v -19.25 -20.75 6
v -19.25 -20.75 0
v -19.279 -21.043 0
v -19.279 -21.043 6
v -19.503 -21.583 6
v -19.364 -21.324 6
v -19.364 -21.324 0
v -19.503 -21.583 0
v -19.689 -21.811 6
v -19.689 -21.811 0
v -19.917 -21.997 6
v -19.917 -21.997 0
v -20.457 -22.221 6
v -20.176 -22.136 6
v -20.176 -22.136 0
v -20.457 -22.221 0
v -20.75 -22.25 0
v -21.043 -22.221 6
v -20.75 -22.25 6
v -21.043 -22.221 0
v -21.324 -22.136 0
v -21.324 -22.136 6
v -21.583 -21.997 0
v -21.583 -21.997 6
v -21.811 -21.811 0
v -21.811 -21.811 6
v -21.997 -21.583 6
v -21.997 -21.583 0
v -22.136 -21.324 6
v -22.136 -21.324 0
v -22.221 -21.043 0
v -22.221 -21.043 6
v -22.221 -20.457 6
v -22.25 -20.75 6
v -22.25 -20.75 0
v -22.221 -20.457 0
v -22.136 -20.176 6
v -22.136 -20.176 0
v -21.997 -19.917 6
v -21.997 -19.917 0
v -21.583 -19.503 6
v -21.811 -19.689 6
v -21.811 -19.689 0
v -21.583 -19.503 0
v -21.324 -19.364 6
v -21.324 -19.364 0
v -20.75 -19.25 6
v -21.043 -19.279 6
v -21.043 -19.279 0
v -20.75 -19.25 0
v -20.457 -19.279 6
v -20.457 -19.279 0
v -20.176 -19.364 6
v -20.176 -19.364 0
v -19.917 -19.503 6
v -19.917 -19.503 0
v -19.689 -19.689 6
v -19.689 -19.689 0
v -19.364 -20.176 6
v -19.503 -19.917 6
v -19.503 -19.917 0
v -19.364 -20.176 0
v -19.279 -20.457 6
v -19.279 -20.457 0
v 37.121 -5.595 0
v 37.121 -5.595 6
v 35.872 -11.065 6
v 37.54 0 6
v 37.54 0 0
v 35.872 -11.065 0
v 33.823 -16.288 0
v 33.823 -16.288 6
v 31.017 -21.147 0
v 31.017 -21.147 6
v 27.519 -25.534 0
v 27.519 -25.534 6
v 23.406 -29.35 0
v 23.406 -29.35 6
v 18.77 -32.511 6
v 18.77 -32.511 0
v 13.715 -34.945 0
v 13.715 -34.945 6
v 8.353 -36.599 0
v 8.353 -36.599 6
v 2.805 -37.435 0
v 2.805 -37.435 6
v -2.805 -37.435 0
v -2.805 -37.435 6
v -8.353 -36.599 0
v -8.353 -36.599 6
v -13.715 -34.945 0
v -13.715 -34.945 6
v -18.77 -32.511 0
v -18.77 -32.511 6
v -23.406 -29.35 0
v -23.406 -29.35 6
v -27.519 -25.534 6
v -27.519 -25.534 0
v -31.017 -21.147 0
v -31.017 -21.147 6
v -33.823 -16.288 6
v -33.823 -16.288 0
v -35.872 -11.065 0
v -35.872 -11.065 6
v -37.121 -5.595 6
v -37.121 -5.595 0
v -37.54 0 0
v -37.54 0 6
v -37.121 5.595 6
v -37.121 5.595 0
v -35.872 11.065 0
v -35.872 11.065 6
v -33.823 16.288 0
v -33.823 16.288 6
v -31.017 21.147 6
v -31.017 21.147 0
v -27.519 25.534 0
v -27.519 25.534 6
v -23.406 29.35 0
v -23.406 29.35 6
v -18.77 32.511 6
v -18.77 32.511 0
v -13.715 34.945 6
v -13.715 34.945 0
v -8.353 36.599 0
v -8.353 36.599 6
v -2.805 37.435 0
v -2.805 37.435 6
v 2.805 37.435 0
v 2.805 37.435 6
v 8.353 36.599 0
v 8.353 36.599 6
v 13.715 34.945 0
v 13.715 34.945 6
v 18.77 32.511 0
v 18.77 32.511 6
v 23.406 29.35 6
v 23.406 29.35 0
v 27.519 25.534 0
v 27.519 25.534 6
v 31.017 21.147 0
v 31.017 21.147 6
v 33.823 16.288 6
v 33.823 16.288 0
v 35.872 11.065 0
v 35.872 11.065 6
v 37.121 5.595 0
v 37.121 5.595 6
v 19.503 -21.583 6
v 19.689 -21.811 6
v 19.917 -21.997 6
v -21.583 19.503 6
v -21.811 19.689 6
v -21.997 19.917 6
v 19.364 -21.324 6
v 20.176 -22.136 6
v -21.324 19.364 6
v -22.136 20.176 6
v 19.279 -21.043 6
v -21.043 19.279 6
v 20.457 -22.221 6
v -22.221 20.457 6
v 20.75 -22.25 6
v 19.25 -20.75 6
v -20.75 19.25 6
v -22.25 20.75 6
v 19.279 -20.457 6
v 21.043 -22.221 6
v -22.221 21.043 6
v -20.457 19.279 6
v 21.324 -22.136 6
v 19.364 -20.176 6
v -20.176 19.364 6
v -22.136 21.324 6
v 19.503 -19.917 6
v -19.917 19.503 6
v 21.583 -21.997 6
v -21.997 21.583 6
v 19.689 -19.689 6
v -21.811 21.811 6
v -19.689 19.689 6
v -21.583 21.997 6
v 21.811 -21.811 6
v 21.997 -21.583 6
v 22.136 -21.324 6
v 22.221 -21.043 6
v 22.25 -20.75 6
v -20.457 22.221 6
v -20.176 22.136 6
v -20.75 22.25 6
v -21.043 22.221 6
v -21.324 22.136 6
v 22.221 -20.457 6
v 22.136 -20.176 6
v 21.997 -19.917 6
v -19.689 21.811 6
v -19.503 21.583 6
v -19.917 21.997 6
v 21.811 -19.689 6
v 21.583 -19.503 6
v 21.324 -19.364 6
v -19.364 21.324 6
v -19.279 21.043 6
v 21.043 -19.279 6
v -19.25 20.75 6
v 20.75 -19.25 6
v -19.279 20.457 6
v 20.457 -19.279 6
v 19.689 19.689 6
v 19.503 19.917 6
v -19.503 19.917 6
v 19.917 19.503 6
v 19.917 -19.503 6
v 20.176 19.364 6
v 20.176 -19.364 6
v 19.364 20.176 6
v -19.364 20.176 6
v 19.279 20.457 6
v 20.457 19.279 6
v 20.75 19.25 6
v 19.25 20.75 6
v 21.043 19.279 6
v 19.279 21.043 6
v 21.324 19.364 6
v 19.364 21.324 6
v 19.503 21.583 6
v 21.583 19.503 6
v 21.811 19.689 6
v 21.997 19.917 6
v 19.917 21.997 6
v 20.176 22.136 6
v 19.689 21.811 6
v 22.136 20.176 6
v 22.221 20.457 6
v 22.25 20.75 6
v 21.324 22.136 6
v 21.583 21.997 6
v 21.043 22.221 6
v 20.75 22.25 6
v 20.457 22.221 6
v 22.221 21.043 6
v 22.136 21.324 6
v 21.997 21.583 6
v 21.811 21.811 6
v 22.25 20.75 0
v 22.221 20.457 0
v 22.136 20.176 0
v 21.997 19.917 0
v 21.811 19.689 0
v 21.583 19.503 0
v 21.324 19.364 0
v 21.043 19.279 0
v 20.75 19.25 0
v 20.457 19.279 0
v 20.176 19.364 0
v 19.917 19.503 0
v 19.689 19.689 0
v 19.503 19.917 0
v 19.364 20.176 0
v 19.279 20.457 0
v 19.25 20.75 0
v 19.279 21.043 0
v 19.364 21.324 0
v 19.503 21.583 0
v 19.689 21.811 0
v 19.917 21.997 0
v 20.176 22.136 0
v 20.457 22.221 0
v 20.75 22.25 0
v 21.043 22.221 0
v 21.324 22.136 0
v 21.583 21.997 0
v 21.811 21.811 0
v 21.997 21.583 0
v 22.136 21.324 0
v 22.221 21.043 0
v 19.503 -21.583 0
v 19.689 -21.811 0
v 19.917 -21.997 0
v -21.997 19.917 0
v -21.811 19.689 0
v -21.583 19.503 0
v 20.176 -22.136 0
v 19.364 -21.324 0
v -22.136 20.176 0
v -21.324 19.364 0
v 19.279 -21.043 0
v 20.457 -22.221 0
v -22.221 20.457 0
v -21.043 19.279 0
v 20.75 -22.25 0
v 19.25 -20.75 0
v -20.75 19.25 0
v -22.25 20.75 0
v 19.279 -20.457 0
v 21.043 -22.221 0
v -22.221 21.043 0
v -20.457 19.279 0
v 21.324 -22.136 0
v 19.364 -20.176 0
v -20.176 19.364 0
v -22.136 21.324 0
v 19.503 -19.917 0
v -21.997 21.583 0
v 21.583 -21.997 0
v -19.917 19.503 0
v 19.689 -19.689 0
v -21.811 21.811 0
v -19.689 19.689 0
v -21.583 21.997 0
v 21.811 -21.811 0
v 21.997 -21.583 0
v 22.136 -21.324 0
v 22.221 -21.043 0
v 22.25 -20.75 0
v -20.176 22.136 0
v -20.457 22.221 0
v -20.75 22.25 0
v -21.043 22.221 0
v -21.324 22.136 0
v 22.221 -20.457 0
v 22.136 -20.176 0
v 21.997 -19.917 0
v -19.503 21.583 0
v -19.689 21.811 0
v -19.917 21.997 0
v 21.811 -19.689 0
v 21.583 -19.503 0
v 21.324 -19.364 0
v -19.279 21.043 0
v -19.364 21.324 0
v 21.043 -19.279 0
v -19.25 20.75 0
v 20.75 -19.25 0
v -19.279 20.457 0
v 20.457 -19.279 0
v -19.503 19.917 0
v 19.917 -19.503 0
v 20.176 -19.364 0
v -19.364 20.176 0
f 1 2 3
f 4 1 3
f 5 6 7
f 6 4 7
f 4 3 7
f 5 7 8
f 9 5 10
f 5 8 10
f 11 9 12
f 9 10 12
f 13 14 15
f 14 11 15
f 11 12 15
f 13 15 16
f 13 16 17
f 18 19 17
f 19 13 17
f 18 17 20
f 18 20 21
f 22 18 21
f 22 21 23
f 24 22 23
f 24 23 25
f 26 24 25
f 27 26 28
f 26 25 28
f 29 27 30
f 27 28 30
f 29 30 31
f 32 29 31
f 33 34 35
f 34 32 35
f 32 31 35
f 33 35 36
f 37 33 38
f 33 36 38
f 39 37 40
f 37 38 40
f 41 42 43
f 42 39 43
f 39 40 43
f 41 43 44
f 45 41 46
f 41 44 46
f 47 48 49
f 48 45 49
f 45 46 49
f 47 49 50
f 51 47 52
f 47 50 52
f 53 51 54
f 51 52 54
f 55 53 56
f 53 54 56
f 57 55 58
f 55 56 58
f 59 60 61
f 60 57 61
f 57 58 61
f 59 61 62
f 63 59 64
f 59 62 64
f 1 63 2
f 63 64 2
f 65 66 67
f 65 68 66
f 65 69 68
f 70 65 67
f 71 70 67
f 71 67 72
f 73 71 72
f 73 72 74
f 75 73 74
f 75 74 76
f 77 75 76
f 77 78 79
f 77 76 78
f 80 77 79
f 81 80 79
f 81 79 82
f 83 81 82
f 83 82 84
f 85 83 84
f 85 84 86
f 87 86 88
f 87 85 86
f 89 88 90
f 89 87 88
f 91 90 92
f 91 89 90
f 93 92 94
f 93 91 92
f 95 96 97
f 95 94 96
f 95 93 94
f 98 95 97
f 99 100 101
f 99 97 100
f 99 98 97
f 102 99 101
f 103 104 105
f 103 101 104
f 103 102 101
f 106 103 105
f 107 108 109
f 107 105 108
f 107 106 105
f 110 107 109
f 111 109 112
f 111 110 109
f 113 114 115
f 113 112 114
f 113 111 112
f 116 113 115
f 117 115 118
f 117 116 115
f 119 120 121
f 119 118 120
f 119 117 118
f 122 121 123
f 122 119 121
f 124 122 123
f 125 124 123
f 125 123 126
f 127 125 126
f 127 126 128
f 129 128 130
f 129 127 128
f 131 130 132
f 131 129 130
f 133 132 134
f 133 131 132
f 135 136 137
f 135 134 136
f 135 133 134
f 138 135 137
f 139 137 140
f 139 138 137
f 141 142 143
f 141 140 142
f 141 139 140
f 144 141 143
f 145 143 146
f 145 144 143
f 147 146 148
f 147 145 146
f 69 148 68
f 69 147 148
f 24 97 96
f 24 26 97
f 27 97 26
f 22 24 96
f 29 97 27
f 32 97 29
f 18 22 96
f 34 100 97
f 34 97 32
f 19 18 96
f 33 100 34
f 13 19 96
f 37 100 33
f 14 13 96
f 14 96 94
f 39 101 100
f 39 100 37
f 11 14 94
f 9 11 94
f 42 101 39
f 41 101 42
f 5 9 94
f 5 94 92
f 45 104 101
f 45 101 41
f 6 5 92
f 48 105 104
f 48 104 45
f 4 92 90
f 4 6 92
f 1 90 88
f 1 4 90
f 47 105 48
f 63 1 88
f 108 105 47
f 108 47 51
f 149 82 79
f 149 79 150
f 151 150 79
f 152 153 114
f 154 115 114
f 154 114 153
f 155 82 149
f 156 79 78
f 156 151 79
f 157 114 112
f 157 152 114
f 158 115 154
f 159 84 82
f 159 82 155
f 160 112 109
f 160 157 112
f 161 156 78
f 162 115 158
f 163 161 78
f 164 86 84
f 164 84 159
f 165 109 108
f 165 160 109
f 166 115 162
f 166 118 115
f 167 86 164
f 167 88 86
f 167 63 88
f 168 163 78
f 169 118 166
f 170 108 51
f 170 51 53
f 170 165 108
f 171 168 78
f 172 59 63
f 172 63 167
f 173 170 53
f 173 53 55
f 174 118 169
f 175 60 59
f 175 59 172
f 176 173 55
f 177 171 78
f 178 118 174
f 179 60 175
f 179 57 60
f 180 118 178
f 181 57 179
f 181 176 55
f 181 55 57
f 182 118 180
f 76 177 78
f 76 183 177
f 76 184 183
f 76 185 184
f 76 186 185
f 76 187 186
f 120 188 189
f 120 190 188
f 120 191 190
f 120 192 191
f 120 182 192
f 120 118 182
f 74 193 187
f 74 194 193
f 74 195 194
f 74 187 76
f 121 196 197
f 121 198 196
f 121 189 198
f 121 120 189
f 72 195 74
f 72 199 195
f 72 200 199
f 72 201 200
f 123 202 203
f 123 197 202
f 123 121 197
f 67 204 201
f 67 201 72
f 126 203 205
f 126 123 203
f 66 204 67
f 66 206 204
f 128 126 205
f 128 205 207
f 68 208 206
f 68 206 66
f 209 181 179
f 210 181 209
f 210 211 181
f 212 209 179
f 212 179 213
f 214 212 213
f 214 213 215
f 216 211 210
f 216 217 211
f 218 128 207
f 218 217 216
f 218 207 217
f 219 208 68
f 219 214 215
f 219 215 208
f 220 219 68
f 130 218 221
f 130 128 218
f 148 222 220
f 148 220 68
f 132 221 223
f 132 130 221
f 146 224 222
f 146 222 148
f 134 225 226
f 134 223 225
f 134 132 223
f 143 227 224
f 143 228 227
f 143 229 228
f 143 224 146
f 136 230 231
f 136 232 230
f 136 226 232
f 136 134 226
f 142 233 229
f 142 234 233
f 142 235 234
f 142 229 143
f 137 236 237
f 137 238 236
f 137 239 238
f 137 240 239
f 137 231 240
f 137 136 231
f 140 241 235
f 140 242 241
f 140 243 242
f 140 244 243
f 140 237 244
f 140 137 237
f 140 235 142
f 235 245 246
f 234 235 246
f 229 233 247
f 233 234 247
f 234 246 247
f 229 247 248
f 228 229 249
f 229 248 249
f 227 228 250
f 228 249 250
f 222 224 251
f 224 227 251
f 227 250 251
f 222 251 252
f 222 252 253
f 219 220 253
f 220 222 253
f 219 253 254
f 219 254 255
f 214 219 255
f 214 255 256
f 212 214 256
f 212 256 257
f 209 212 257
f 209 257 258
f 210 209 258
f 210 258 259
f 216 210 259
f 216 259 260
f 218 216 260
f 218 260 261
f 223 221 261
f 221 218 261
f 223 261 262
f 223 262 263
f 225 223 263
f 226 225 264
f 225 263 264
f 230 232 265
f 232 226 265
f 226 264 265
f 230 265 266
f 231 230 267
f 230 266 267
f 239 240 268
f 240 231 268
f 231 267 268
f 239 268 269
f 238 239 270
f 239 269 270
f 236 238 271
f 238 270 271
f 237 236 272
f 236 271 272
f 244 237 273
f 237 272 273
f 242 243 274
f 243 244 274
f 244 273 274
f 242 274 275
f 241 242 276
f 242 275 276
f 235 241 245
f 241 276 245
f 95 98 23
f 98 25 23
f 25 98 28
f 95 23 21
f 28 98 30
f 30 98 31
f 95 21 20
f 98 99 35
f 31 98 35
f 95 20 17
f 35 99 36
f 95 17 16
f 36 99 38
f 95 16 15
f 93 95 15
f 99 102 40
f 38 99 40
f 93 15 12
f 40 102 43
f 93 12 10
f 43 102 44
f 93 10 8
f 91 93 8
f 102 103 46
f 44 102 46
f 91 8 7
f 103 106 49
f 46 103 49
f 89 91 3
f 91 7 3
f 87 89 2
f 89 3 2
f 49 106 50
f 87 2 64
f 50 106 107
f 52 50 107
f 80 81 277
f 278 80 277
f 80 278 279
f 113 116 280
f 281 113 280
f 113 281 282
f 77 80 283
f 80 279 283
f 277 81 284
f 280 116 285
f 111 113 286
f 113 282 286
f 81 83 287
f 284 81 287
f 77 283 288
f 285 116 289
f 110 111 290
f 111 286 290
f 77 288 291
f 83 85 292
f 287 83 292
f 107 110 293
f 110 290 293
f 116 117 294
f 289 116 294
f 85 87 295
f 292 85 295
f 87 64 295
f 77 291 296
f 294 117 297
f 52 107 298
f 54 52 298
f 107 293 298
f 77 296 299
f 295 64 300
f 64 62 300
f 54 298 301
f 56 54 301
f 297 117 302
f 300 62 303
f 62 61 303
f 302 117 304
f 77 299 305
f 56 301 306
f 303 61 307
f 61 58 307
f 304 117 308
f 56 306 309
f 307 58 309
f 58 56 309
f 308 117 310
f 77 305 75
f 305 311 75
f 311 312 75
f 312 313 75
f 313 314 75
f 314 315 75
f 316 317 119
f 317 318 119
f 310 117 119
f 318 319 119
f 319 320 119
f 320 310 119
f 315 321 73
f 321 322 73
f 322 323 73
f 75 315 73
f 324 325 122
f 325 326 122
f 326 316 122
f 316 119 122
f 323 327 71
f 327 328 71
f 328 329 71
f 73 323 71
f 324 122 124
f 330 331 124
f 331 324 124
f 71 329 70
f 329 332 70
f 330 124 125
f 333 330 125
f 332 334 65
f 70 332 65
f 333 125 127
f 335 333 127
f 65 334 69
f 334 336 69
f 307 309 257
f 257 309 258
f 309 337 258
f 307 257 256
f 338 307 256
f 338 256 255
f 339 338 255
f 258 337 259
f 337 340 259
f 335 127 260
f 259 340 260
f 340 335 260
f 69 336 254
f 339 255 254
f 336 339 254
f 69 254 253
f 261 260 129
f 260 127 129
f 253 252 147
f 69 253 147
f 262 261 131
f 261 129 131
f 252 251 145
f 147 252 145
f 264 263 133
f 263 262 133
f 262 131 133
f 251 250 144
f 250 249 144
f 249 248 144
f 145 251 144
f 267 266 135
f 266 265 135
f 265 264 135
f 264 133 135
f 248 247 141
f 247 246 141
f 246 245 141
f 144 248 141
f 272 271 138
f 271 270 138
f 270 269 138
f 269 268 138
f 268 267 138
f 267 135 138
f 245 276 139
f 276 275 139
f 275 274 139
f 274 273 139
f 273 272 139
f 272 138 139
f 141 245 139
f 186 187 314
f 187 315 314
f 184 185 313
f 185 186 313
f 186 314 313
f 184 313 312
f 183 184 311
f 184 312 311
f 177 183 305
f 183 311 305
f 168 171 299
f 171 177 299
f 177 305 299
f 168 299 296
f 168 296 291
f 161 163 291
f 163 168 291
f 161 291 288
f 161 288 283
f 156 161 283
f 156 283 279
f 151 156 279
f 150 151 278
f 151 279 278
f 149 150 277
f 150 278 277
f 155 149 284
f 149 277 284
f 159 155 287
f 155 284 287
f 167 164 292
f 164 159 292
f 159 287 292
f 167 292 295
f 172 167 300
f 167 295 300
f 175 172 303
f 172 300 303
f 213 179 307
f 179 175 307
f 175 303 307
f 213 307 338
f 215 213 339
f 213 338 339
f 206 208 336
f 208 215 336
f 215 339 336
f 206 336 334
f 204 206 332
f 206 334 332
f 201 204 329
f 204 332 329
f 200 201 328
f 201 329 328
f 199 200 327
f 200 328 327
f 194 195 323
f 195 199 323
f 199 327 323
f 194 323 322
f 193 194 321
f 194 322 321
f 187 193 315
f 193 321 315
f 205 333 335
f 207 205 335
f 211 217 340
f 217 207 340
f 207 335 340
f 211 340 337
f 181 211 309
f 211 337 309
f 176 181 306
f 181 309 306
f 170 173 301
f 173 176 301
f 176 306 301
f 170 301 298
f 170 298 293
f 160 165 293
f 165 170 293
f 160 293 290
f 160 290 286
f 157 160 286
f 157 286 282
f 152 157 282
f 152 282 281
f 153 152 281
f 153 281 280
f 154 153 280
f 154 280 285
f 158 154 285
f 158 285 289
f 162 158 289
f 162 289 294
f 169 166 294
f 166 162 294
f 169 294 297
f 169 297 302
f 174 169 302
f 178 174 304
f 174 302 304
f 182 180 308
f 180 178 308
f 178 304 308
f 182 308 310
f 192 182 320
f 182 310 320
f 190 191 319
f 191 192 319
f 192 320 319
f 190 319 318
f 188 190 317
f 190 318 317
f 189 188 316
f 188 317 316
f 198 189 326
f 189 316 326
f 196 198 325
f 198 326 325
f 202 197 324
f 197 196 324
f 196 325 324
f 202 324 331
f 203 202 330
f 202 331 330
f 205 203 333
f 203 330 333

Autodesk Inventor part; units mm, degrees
ref_plane "YZ Plane" through (0, 0, 0) normal (1, 0, 0) x (0, 1, 0)
ref_plane "XZ Plane" through (0, 0, 0) normal (0, 1, 0) x (-1, 0, 0)
ref_plane "XY Plane" through (0, 0, 0) normal (0, 0, 1) x (1, 0, 0)
ref_plane "Work Plane1" through (0, 0, 0) normal (0, 0, 1) x (1, 0, 0)
sketch "Sketch1" plane through (0, 0, 0) normal (0, 0, 1) x (1, 0, 0)
  circle A0 centre (-20.75, 20.75) radius 1.5
  circle A1 centre (-20.75, -20.75) radius 1.5
  circle A2 centre (20.75, 20.75) radius 1.5
  circle A3 centre (20.75, -20.75) radius 1.5
  circle A4 centre (0, 0) radius 37.5402
extrude "Plate1" add sketch "Sketch1" along normal blind 6
equation "\"d0\" = Thickness"
equation "\"BendRadius\" = Thickness"
equation "\"BendReliefWidth\" = Thickness"
equation "\"BendReliefDepth\" = 0.5 * Thickness"
equation "\"CornerReliefSize\" = 4 * Thickness"
equation "\"MinimumRemnant\" = 2 * Thickness"
equation "\"TransitionRadius\" = BendRadius"
equation "\"JacobiRadiusSize\" = BendRadius"
equation "\"GapSize\" = Thickness"
equation "\"Thickness\" = 6"
properties part number "spacer lidar" material "Wood (Birch)"
